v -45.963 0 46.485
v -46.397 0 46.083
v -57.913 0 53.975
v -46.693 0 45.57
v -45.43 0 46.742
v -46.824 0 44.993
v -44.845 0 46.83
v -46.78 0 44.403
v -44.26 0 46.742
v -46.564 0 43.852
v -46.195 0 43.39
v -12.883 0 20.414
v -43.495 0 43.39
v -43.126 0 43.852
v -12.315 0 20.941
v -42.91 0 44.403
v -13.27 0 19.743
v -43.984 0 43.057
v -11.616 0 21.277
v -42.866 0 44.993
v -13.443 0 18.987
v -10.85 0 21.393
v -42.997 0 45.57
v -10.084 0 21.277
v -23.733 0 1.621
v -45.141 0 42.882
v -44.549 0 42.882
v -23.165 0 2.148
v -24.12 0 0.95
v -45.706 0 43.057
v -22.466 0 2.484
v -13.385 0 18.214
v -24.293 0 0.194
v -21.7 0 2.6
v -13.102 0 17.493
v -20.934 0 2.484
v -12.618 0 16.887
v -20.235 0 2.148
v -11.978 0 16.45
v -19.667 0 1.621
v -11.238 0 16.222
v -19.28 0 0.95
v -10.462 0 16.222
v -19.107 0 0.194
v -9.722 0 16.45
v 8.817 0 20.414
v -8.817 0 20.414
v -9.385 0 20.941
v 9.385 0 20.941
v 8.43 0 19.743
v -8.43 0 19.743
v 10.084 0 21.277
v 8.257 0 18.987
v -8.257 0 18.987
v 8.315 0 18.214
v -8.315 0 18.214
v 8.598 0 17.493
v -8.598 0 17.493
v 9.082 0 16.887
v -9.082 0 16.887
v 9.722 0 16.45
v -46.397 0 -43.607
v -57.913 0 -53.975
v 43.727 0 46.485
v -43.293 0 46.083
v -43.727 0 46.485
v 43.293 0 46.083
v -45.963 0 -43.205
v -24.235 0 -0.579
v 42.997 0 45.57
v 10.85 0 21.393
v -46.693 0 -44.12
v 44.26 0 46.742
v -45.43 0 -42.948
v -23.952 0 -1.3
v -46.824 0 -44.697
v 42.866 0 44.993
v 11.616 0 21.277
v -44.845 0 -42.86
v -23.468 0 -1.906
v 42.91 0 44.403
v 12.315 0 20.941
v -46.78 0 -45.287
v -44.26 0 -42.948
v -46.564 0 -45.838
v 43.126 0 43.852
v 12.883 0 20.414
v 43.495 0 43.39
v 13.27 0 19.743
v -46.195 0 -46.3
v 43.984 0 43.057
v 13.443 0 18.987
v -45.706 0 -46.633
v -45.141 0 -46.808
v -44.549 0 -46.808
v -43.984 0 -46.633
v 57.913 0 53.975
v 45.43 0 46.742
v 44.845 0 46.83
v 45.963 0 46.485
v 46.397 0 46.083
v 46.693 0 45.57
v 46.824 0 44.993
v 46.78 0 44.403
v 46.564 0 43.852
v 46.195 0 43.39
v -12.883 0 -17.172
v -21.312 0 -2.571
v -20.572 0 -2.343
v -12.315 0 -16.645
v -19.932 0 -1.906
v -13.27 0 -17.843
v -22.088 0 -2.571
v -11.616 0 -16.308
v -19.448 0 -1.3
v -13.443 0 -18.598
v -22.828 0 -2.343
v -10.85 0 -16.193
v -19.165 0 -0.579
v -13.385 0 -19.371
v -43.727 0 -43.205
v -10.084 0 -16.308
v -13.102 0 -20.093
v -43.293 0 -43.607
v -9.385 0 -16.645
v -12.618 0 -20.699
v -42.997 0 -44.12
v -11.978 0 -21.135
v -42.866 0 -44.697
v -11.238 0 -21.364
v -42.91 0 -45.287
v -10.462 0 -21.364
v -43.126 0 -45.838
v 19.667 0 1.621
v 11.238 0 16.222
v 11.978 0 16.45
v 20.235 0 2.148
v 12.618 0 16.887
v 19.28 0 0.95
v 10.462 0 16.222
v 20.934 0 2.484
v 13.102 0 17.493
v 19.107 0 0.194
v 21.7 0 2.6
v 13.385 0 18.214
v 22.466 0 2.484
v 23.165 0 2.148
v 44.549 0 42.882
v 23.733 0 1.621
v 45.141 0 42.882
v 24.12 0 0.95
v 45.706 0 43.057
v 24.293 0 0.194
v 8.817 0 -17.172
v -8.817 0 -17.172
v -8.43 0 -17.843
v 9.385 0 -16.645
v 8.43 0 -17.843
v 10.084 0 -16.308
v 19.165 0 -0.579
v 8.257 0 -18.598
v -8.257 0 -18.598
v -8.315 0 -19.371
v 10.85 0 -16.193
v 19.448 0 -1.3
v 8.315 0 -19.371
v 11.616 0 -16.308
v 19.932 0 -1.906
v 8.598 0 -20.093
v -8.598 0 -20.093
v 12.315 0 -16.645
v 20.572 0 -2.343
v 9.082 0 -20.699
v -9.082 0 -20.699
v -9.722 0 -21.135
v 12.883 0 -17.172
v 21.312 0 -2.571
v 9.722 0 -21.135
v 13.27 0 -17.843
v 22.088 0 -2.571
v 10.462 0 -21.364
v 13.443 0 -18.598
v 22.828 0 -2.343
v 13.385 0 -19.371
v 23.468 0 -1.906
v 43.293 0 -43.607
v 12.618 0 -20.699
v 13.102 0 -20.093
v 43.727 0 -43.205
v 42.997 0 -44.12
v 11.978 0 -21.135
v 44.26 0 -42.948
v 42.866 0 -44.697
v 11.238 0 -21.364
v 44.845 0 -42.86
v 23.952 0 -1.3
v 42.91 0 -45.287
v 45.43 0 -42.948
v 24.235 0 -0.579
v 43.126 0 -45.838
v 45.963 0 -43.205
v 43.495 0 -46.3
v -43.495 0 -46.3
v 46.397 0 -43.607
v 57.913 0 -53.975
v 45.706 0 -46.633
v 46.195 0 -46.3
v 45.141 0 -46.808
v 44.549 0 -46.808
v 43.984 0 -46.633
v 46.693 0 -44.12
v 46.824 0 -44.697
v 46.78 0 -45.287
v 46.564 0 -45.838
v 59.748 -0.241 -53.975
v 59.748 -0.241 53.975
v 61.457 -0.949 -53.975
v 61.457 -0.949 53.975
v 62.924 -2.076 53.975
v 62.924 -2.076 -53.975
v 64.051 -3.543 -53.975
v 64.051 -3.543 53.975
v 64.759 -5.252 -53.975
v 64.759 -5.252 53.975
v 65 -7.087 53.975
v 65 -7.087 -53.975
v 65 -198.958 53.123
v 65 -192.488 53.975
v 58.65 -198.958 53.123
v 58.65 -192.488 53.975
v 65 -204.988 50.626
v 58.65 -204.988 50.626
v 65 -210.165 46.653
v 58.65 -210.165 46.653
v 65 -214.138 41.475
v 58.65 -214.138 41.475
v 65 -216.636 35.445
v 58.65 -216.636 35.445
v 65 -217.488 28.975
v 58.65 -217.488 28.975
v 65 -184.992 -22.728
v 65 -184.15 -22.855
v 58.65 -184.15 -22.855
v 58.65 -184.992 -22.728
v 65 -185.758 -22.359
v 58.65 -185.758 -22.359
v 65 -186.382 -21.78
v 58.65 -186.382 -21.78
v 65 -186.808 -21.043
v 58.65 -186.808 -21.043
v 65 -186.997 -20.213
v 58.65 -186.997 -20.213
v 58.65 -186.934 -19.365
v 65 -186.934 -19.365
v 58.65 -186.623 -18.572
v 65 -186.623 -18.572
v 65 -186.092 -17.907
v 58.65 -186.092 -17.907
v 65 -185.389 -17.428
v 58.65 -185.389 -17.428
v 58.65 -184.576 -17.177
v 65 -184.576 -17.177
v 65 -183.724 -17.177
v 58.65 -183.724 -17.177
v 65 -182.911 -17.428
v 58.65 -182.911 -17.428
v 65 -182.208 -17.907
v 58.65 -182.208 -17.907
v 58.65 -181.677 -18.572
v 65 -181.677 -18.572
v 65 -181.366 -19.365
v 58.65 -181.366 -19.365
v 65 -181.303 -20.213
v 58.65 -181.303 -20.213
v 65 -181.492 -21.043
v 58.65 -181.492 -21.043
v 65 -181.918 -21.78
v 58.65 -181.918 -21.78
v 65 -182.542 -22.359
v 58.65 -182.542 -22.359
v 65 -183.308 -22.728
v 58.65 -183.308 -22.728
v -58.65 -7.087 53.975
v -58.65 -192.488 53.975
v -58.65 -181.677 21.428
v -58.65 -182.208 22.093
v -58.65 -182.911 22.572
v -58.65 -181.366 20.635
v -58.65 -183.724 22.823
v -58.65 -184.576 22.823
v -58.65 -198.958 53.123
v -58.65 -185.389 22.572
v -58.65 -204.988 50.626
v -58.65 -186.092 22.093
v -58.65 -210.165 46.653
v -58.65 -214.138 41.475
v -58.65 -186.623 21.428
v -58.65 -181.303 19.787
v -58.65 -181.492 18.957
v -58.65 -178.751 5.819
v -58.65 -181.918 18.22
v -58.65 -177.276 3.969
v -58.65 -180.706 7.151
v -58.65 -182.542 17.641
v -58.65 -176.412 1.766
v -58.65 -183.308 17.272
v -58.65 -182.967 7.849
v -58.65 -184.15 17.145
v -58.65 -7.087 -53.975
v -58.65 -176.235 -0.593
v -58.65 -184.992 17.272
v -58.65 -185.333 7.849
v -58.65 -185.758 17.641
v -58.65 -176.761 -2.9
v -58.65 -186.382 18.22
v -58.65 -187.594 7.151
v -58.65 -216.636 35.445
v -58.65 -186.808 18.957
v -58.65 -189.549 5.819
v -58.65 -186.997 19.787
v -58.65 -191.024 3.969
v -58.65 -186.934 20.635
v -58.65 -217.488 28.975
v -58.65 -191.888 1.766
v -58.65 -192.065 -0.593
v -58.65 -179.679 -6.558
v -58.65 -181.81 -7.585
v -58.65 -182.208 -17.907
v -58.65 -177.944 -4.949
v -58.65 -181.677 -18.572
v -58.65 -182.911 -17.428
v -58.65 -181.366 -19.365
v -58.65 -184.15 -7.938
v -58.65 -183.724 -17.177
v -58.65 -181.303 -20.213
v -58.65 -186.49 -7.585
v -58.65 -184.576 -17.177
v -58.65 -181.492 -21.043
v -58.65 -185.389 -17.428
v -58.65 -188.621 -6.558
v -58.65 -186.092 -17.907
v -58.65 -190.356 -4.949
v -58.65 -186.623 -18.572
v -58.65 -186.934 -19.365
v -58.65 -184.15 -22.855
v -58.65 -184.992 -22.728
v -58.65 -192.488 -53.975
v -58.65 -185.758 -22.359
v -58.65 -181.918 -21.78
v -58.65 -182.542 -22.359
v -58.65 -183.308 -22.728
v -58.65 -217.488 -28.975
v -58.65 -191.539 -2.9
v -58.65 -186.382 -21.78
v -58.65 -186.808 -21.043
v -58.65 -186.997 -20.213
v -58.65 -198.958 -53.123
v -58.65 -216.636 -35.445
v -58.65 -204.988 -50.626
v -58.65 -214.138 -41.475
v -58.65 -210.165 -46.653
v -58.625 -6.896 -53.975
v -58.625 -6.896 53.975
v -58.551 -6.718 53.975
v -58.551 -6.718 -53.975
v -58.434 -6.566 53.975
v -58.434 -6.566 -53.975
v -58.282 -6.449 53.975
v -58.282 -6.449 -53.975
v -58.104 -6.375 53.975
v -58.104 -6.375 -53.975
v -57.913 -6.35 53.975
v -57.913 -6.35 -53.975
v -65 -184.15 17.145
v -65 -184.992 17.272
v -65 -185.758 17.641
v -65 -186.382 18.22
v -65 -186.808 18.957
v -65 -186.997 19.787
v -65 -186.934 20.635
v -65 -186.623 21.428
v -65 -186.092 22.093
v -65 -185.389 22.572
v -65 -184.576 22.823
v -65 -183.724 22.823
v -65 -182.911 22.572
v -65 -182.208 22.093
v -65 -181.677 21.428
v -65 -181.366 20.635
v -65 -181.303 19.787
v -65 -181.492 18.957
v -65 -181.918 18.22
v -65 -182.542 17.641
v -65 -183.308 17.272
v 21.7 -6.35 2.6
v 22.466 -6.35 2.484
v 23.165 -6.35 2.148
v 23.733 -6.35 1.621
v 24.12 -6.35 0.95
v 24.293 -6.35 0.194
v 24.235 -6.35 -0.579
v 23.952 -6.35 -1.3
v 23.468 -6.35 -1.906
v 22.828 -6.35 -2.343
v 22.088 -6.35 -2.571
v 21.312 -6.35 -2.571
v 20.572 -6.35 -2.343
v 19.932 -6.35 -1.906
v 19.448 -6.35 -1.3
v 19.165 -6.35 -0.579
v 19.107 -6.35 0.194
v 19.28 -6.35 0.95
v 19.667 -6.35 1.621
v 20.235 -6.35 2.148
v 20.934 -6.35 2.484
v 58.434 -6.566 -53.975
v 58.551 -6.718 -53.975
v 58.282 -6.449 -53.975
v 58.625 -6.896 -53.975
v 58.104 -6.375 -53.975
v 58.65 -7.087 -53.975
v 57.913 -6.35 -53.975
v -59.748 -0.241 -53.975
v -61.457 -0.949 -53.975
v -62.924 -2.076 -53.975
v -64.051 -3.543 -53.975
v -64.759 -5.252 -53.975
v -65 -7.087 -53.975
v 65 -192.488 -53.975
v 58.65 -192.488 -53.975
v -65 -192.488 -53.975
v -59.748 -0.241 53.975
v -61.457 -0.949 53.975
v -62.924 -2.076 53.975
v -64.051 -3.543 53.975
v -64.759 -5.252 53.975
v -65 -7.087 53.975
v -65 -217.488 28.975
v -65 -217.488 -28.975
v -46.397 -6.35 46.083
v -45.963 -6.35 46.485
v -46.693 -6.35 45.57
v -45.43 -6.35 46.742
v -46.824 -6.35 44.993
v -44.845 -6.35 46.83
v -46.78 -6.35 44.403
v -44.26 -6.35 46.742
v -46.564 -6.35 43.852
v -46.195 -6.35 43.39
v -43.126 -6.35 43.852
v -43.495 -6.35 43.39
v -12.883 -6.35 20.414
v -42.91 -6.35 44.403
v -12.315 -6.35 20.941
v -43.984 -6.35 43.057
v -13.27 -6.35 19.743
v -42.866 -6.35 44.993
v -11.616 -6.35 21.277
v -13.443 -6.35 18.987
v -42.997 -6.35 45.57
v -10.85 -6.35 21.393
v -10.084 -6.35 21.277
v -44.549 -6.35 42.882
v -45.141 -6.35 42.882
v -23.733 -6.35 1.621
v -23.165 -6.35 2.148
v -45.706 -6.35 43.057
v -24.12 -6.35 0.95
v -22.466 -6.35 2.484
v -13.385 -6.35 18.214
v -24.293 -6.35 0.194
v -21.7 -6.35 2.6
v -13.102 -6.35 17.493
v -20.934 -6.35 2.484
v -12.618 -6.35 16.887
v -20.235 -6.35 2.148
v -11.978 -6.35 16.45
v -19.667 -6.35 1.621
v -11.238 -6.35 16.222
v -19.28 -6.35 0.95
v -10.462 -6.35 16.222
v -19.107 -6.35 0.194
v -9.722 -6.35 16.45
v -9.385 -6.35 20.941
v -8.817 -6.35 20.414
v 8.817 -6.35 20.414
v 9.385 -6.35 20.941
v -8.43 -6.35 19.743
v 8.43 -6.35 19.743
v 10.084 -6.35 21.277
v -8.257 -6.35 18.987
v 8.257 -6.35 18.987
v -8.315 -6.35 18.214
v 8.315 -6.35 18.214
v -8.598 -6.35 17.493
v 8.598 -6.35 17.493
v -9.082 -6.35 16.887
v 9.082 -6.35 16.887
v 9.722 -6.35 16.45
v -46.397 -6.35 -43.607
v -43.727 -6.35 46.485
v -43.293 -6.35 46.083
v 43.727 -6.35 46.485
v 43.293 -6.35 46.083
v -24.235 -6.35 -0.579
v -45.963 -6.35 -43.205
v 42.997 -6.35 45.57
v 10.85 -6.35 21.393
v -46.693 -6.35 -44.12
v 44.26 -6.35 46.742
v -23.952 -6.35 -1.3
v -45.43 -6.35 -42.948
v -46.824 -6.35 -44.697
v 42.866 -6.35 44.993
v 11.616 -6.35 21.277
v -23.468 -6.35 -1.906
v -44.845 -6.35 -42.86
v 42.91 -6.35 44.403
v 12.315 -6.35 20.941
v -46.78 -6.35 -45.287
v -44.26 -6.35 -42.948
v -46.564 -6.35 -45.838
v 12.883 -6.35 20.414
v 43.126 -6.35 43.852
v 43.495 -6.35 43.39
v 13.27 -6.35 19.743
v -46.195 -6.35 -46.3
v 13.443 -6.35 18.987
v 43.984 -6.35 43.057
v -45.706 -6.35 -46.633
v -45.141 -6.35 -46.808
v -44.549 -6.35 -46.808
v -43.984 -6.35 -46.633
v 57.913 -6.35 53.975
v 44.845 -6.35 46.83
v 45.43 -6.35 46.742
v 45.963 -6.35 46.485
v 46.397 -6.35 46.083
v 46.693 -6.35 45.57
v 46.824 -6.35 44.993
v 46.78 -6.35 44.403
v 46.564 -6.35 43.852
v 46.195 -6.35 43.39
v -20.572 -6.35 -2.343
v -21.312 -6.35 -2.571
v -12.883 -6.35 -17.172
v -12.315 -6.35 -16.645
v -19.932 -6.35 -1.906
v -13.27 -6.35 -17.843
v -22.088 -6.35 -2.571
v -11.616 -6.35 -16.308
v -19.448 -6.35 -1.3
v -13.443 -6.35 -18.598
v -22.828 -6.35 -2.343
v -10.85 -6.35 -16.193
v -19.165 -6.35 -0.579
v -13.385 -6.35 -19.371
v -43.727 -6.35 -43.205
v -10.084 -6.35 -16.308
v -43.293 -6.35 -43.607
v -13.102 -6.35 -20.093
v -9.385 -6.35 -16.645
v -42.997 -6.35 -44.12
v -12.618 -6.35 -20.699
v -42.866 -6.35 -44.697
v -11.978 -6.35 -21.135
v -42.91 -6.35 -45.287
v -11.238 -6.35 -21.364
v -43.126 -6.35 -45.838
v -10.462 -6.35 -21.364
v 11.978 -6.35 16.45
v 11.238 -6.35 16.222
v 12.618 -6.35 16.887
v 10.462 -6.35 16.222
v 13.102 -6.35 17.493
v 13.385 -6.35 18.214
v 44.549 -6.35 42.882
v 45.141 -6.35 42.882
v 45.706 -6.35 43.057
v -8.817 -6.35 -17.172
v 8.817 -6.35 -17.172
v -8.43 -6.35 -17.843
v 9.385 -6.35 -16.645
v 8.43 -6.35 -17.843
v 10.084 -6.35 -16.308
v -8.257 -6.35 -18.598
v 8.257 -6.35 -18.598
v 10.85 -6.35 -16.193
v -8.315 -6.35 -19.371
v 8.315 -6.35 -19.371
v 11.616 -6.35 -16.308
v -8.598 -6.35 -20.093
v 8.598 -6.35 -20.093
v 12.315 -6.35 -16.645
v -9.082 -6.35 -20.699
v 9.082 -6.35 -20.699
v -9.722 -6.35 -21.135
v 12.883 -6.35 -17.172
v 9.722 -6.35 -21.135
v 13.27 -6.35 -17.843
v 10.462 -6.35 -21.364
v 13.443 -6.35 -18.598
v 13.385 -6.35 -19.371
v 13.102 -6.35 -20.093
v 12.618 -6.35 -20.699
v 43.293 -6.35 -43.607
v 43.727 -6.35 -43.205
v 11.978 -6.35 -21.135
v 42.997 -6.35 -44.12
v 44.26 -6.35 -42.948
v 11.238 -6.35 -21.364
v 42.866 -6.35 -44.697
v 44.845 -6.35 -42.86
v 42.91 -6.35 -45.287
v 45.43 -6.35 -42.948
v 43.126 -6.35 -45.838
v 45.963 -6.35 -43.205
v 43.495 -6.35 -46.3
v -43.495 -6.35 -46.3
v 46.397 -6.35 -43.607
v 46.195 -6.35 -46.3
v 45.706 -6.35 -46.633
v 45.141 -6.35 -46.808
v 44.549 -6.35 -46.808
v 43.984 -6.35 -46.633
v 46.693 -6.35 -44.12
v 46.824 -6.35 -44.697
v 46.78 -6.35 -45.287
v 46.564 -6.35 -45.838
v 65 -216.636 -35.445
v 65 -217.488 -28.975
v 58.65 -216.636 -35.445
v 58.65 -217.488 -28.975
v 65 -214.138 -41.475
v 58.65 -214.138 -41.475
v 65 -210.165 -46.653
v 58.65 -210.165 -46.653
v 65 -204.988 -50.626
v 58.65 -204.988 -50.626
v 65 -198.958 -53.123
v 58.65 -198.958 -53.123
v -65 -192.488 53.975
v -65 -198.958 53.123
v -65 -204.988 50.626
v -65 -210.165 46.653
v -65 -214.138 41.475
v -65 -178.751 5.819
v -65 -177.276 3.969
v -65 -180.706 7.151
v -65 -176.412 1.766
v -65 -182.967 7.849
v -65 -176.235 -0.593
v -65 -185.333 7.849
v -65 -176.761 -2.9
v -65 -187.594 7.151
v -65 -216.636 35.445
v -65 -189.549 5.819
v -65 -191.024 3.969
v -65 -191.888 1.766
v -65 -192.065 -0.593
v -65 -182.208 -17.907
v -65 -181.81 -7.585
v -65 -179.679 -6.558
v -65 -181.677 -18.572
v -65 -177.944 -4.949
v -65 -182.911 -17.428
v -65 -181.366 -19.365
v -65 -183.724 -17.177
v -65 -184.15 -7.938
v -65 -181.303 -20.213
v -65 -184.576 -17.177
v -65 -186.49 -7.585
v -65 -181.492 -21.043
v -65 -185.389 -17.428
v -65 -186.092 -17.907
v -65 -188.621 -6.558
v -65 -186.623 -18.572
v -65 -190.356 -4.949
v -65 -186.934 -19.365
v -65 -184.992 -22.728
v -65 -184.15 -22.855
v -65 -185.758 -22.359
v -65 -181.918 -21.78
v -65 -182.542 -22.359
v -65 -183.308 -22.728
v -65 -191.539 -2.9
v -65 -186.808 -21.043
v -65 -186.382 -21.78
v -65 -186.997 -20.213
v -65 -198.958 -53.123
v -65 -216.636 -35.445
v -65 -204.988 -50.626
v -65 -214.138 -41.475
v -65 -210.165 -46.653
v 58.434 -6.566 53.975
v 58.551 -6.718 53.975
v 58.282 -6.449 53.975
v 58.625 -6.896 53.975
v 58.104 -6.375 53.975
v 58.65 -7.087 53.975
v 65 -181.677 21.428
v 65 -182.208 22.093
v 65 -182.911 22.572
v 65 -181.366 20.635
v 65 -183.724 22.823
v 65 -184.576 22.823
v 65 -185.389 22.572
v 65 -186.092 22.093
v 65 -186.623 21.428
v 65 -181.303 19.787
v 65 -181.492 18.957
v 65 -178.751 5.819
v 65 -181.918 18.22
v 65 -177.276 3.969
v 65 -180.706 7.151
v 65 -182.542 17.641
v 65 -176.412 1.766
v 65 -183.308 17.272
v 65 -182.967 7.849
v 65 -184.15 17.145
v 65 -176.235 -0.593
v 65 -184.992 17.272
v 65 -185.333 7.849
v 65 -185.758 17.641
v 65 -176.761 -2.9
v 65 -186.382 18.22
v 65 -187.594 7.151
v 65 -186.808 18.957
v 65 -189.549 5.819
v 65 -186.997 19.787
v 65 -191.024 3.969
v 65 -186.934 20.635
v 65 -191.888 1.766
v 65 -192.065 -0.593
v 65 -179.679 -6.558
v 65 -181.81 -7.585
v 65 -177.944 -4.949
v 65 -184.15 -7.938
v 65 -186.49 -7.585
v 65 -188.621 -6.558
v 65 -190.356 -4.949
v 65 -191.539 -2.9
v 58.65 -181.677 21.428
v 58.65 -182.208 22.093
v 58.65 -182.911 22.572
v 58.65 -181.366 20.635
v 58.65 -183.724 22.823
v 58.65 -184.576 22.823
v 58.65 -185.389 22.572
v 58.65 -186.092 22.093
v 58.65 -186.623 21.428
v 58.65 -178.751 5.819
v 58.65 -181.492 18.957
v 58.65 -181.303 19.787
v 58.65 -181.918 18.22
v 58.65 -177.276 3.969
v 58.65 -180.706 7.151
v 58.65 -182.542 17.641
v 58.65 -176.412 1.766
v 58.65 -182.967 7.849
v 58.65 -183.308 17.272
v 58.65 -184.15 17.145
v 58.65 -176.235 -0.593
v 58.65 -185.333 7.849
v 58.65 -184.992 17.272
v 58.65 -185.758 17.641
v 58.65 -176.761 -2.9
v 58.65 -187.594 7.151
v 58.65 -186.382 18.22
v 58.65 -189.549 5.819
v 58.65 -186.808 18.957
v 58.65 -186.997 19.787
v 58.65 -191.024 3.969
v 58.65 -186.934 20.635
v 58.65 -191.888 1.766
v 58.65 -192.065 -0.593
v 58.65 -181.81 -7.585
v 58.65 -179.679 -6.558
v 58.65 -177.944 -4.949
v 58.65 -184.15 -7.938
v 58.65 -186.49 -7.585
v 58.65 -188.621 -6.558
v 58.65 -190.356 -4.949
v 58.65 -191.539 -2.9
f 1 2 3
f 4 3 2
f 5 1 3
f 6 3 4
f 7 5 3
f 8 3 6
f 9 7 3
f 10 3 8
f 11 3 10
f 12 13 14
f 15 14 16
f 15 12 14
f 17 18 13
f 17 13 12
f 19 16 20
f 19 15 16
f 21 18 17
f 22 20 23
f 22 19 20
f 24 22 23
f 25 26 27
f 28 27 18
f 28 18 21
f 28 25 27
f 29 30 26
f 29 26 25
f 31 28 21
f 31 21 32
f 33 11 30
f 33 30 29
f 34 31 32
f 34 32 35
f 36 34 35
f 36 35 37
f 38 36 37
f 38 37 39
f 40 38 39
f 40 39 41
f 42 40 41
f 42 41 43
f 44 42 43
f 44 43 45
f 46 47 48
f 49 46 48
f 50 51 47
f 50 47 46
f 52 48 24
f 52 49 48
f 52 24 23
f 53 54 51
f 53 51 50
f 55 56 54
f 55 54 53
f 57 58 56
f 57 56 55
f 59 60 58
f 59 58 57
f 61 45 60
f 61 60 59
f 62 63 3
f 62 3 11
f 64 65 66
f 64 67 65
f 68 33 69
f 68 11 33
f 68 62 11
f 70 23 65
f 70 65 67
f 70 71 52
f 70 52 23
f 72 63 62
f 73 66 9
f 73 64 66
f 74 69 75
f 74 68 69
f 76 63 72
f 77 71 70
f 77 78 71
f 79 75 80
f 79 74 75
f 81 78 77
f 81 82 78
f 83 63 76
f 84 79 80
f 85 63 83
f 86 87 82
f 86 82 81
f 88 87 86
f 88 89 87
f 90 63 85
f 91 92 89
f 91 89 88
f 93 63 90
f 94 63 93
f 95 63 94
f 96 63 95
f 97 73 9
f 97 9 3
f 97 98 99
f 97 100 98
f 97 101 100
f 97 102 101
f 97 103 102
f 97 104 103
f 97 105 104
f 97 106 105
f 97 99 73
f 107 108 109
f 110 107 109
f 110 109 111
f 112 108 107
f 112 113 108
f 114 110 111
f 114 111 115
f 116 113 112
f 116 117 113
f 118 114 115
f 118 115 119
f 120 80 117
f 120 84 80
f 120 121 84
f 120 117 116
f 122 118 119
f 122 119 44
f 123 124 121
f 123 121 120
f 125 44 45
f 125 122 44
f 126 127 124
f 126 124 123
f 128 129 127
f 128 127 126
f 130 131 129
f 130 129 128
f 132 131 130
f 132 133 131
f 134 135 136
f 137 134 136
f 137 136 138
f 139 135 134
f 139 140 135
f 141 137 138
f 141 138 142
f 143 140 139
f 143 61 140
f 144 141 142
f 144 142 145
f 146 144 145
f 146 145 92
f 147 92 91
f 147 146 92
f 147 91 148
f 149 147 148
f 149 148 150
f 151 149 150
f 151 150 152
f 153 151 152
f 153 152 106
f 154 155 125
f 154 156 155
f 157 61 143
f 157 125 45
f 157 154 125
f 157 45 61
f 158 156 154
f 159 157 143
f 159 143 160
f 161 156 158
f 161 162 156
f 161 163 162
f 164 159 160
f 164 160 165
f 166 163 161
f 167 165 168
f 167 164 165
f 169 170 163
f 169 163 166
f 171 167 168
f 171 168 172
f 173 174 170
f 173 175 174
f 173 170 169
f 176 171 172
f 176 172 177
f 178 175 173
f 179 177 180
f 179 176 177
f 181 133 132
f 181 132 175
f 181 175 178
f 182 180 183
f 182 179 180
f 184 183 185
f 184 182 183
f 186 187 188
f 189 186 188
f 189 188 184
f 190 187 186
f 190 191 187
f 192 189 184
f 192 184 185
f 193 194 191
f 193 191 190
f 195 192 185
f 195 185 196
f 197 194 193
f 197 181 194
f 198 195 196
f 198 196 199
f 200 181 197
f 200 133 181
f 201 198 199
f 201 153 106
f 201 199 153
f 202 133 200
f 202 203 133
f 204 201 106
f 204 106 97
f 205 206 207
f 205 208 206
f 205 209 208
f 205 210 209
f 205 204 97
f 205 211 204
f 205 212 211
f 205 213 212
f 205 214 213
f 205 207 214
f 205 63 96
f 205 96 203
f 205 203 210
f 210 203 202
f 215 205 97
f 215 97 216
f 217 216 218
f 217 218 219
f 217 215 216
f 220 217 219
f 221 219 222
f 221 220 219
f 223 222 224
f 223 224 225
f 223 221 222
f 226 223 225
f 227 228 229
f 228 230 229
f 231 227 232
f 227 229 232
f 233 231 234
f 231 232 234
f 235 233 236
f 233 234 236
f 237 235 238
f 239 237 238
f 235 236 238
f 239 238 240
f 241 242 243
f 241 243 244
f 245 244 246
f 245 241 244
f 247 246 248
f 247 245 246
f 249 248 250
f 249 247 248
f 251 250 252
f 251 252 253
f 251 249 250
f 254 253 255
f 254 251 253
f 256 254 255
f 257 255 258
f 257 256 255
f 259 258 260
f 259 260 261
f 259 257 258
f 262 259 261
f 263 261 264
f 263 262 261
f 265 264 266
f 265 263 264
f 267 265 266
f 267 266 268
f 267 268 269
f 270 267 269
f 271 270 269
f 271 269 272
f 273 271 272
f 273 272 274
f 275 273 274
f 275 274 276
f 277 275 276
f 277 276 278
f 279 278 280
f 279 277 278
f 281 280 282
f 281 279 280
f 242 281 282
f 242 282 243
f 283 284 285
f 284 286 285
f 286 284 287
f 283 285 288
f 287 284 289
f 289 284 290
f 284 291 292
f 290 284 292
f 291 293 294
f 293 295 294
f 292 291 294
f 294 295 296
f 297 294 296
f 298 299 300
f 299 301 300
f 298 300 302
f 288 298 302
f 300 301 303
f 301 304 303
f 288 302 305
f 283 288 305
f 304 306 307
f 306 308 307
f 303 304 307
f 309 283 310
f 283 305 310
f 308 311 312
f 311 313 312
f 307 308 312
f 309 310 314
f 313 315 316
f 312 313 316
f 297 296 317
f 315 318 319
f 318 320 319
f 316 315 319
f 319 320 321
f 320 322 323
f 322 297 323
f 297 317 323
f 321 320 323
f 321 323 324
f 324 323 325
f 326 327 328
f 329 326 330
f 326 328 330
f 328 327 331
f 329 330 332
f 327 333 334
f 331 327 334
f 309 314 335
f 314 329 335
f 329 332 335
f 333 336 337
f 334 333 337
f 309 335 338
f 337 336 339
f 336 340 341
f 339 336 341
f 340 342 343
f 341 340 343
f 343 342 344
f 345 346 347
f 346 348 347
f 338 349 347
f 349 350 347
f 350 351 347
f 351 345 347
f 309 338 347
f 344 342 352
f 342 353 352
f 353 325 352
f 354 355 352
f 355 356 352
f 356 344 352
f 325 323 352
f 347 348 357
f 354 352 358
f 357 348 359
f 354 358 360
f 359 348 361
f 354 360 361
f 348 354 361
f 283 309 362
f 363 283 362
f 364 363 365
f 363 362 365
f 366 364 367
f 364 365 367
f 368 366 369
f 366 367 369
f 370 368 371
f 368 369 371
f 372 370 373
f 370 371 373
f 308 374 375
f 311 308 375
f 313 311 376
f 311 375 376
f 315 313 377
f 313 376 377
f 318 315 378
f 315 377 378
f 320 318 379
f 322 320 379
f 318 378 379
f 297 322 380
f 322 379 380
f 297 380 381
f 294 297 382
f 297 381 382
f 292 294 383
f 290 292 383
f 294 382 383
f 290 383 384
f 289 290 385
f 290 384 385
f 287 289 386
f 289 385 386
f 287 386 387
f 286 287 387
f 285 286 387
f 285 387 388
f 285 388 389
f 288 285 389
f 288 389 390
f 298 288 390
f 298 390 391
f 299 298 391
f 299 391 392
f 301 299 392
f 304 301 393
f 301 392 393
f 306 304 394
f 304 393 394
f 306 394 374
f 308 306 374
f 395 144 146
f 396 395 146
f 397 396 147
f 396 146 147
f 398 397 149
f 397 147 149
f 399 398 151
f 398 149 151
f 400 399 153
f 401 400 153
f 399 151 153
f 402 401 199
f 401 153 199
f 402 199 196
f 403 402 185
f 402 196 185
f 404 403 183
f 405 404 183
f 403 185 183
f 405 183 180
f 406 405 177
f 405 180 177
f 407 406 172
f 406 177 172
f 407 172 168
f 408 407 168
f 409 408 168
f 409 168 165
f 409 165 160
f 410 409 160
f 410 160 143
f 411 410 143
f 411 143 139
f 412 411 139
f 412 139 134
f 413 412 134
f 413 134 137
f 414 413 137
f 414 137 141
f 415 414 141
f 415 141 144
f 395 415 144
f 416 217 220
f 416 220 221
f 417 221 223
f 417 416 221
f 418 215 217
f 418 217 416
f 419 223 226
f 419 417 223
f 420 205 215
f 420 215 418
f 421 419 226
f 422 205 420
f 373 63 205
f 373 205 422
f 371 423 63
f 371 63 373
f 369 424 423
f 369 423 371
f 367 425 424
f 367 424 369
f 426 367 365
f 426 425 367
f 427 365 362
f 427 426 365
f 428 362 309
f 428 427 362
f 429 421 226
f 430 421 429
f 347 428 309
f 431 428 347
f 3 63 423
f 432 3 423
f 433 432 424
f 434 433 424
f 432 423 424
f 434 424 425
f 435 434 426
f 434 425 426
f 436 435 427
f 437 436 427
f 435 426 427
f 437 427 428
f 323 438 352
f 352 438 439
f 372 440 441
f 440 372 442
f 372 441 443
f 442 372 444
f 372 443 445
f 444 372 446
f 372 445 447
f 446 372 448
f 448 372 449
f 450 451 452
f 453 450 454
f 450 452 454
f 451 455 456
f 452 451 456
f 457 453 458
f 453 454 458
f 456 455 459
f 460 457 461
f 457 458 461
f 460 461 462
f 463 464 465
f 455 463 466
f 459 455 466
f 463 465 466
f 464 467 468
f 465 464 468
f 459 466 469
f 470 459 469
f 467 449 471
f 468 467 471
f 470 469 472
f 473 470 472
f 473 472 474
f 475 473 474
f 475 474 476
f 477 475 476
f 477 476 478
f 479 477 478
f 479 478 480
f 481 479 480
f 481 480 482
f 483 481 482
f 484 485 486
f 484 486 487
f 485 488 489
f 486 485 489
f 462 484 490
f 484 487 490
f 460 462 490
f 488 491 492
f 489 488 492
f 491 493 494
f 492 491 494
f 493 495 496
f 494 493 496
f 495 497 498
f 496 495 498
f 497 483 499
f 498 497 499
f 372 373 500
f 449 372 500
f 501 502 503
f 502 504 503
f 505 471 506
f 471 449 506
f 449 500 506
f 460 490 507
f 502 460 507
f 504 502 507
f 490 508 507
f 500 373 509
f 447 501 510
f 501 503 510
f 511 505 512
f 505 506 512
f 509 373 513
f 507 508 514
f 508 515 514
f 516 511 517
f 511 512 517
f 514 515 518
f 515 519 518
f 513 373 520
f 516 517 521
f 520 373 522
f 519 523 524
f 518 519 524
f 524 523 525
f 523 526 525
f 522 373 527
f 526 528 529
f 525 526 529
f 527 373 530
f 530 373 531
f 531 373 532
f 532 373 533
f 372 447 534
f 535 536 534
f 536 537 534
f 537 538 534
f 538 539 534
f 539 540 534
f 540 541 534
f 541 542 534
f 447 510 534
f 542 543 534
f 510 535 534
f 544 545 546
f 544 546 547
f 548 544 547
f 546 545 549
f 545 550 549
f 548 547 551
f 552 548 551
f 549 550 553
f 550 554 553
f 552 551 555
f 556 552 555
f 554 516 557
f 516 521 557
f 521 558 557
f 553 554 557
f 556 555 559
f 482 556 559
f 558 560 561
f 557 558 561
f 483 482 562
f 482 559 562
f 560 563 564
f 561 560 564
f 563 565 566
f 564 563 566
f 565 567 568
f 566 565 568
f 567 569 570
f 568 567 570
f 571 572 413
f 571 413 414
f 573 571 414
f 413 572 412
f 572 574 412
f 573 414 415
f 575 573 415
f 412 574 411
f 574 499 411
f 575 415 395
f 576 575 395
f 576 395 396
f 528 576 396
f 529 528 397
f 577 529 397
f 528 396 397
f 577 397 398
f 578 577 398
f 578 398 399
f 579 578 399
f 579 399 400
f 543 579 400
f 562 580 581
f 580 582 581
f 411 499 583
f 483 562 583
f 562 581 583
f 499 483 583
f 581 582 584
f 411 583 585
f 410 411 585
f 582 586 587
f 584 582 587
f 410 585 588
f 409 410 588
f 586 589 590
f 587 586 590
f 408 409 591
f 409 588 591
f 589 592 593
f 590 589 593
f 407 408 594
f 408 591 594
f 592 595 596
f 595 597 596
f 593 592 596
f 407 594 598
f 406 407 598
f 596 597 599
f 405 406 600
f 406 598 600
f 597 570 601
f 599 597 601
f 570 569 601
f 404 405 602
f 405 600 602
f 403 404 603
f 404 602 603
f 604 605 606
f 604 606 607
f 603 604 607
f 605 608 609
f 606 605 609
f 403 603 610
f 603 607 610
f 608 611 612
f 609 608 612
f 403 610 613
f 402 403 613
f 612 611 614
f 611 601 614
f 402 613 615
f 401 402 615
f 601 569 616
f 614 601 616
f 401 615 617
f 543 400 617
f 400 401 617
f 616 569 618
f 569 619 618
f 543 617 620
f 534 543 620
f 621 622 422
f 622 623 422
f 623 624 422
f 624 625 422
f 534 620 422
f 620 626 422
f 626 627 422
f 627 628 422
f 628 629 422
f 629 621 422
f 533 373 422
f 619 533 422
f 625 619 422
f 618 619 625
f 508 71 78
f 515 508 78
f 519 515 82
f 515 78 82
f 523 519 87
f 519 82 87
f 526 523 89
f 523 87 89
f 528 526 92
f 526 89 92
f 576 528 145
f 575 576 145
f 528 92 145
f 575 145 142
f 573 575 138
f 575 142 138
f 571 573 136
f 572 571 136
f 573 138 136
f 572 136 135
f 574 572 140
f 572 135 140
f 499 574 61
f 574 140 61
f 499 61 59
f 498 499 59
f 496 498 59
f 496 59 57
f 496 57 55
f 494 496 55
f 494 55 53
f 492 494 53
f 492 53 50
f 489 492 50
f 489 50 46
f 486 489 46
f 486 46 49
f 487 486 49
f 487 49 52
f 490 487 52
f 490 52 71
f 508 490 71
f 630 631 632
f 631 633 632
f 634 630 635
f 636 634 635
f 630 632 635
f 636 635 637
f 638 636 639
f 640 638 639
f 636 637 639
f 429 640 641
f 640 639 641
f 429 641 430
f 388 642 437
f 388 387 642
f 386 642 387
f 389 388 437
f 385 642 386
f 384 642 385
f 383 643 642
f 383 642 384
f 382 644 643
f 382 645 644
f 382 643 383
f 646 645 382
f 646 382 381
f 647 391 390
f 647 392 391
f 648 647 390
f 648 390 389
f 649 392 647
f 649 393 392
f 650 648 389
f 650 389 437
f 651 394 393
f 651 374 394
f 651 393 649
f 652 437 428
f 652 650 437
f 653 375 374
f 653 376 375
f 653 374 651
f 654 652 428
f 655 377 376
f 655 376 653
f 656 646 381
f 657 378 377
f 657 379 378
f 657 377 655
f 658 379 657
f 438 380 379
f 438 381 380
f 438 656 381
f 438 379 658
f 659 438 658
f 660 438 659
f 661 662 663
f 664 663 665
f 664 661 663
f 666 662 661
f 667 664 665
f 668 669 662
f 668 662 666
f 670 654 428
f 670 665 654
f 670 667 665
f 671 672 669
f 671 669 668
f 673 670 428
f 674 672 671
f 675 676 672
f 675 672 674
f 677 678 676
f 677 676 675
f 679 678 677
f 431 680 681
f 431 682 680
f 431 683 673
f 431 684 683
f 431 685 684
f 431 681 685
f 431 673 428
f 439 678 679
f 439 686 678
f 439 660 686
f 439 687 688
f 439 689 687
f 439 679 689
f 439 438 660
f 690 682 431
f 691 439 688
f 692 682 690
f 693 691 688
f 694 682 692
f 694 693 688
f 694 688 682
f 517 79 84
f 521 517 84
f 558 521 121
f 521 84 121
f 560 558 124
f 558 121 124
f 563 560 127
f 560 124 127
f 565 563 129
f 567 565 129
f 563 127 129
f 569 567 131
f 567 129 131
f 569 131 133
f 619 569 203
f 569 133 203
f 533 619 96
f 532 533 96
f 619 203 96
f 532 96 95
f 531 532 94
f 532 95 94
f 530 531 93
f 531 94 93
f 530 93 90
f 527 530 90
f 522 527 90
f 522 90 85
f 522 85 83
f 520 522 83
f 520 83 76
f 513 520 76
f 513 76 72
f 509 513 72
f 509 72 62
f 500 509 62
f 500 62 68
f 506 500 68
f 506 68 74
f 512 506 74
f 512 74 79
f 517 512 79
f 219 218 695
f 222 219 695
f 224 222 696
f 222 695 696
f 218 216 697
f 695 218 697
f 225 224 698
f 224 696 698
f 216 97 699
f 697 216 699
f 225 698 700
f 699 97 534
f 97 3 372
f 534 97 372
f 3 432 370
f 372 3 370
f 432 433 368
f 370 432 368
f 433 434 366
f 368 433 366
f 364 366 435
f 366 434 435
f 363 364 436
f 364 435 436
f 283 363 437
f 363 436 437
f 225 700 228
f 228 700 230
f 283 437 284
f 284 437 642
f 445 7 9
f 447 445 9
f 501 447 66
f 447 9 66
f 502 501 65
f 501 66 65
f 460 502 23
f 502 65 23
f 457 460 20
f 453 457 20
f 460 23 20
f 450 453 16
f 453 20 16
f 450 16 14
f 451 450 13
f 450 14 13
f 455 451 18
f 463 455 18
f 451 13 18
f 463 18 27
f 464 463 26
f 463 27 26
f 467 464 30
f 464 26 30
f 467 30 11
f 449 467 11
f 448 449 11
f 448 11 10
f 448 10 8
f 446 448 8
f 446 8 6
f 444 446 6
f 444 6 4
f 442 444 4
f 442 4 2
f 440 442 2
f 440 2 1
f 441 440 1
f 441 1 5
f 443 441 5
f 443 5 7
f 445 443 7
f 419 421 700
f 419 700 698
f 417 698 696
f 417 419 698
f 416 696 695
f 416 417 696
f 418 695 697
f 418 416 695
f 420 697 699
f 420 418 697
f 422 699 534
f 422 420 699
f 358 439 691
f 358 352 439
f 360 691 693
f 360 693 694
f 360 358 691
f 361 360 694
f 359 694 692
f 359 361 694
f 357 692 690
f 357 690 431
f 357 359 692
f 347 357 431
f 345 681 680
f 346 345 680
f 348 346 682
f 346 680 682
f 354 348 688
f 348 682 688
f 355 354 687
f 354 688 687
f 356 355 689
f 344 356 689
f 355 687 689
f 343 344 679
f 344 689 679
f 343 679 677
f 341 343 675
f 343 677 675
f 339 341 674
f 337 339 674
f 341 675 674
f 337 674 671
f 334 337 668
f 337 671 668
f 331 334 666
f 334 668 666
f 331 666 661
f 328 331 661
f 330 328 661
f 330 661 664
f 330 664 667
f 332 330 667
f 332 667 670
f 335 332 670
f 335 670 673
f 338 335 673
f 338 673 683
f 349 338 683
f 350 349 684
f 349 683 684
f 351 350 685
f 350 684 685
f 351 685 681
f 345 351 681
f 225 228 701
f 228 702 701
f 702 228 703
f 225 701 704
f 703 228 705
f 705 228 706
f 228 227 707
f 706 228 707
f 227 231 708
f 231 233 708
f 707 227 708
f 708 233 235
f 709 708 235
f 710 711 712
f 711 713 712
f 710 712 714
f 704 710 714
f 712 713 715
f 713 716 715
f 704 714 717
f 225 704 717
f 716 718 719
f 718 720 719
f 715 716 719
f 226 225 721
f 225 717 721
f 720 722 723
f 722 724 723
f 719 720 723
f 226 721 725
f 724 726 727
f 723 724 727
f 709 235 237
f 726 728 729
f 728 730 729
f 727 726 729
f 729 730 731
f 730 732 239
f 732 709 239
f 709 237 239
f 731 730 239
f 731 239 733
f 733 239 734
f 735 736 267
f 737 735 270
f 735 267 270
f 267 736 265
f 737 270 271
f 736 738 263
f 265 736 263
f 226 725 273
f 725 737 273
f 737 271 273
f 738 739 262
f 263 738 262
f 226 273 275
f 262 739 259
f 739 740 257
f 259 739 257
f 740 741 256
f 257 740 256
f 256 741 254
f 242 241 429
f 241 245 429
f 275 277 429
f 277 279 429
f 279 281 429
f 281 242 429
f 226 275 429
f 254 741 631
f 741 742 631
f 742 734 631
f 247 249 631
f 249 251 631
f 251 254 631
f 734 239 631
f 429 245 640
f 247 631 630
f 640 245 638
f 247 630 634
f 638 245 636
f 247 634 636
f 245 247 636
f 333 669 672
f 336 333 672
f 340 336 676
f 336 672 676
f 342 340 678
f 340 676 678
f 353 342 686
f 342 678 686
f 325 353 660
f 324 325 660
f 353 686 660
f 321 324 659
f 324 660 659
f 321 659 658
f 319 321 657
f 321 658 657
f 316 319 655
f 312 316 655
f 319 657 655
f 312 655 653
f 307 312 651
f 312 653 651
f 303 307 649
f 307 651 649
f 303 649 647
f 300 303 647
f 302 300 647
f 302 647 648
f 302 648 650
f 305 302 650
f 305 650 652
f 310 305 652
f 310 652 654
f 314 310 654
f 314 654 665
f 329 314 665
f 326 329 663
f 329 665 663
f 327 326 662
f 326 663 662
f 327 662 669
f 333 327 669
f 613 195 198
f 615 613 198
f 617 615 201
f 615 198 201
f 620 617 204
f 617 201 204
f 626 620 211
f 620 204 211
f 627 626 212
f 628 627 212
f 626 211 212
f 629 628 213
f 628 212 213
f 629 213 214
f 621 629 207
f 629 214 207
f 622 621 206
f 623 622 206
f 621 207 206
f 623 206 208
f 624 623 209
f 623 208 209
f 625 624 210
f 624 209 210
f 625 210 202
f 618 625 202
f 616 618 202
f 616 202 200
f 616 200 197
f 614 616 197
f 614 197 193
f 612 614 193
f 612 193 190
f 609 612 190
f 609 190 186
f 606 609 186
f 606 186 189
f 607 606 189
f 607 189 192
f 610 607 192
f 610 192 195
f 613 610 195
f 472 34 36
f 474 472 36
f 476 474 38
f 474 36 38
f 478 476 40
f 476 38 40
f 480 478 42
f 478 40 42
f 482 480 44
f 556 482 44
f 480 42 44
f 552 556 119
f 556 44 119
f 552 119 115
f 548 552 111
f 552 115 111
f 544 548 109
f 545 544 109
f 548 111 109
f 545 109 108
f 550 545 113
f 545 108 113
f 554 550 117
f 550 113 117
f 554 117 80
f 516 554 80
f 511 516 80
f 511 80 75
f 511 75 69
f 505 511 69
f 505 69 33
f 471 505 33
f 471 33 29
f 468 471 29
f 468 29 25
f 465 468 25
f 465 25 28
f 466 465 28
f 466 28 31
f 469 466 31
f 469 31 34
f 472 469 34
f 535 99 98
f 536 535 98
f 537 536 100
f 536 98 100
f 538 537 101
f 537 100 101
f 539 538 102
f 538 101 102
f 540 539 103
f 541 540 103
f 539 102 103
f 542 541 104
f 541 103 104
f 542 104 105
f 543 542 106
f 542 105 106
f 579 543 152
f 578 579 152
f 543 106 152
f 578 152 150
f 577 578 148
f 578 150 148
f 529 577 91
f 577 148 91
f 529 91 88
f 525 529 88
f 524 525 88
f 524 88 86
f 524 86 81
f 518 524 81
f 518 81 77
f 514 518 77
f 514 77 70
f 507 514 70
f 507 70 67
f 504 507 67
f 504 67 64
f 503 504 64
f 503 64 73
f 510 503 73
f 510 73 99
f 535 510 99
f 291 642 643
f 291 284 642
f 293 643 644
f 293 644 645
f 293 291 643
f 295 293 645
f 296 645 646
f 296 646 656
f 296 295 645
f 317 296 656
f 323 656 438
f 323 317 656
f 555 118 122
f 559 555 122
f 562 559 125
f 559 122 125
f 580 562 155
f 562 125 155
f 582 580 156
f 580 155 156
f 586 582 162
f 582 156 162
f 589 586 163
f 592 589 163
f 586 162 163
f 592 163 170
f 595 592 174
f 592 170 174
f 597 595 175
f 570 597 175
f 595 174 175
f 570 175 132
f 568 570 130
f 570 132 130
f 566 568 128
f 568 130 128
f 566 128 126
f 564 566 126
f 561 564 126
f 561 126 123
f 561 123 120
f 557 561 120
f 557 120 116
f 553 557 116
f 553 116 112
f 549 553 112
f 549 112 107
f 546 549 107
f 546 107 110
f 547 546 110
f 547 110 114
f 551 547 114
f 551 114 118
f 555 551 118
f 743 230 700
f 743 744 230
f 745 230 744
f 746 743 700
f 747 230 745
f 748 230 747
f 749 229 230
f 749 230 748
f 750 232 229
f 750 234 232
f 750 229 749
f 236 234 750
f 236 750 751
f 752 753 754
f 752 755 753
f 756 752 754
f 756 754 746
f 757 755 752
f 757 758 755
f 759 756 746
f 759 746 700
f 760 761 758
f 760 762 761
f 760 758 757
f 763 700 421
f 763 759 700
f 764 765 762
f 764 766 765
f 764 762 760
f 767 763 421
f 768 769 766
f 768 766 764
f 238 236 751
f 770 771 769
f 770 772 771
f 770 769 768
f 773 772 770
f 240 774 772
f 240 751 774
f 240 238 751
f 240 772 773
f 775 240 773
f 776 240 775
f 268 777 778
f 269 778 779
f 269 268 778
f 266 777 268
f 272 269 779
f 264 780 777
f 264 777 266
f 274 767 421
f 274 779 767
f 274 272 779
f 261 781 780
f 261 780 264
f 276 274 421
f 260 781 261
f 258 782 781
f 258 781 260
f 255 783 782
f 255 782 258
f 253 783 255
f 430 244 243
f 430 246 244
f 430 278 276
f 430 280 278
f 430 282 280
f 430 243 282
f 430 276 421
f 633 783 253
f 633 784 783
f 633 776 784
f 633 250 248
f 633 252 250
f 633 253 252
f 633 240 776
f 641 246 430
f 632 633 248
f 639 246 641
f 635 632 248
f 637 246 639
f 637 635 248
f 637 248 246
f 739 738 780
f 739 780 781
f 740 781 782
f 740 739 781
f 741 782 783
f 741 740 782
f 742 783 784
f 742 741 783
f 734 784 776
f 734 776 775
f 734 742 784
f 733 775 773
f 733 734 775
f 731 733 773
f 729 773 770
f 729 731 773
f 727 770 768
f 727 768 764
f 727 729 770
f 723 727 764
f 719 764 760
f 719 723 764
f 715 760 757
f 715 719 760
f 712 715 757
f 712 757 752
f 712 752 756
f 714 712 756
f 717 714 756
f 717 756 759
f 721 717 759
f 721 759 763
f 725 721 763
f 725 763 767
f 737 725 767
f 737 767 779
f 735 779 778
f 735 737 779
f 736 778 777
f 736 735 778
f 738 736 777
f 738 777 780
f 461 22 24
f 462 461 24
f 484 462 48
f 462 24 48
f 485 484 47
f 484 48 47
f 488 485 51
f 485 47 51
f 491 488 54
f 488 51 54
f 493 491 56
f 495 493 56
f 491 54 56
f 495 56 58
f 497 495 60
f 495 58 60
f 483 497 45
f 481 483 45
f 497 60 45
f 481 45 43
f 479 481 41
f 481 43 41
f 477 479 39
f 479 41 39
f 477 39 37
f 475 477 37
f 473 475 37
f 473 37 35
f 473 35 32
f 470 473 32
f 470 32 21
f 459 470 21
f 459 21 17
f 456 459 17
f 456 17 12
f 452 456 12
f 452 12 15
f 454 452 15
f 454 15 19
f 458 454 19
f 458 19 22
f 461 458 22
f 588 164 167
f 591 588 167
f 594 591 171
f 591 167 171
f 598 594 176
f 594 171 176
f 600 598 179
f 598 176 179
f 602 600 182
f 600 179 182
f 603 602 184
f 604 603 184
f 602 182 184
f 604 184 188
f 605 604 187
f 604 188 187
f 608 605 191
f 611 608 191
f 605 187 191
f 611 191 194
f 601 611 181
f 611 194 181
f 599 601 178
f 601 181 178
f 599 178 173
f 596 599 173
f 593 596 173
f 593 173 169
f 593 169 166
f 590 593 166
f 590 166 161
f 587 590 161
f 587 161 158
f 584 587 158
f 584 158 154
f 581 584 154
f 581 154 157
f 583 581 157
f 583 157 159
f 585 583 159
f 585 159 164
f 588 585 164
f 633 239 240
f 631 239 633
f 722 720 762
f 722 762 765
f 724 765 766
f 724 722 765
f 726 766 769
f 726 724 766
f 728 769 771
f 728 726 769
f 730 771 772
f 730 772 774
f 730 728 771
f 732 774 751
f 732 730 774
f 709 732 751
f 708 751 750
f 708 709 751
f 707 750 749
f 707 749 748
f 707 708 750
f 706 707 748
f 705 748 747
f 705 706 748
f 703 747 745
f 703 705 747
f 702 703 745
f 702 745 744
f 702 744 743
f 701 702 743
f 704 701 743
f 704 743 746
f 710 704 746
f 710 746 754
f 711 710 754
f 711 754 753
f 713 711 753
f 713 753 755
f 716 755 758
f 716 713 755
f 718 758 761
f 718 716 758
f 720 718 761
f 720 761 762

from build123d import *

# Parameters (mm, degrees)
SKETCH3_W                    = 130
SKETCH3_H                    = 107.95
BASE_FLANGE1_DEPTH           = 6.35
EDGE_FLANGE1_STRIP_W         = 26.8732
EDGE_FLANGE1_STRIP_H         = 6.35
EDGE_FLANGE1_STRIP_CUT_DEPTH = 107.95
EDGE_FLANGE1_DEPTH           = 107.95
EDGE_FLANGE1_PROFILE_W       = 107.95
EDGE_FLANGE1_PROFILE_H       = 210.4009
EDGE_FLANGE1_PROFILE_R       = 2.855235605
EDGE_FLANGE1_PROFILE_R_2     = 7.9375
EDGE_FLANGE1_FLAT_DEPTH      = 6.35
FILLET1_R                    = 25
SKETCH13_R                   = 2.6
FLANGE_COUPLING_HOLES_DEPTH  = 234.321909133
SKETCH15_R                   = 1.985
CUT_EXTRUDE1_DEPTH           = 234.321909133


# Sheet-metal steps are written as plain solids
with BuildPart() as part:
    # Sketch3 → Base-Flange1 (new body)
    with BuildSketch(Plane(origin=(0, 0, 0), x_dir=(1, 0, 0), z_dir=(0, 1, 0))):
        Rectangle(SKETCH3_W, SKETCH3_H)
    extrude(amount=-BASE_FLANGE1_DEPTH)

    # Edge-Flange1 strip (across the edge) → Edge-Flange1 strip cut (cut)
    with BuildSketch(Plane(origin=(65, -6.35, -53.975), x_dir=(-1, 0, 0), z_dir=(0, 0, 1))):
        with Locations((-6.35, -3.175)):
            Rectangle(EDGE_FLANGE1_STRIP_W, EDGE_FLANGE1_STRIP_H)
    edge_flange1_strip_cut = extrude(amount=EDGE_FLANGE1_STRIP_CUT_DEPTH, mode=Mode.SUBTRACT)

    # Edge-Flange1 bend section (across the edge) → Edge-Flange1 (add)
    with BuildSketch(Plane(origin=(65, -6.35, -53.975), x_dir=(-1, 0, 0), z_dir=(0, 0, 1))):
        with BuildLine():
            Line((0, 0.7366), (6.35, 0.7366))
            ThreePointArc((6.35, 0.7366), (6.565745145, 0.215745145), (7.0866, 0))
            Line((7.0866, 0), (7.0866, -6.35))
            ThreePointArc((7.0866, -6.35), (2.075617084, -4.274382916), (0, 0.7366))
        make_face()
    edge_flange1 = extrude(amount=EDGE_FLANGE1_DEPTH)

    # Edge-Flange1 profile (on flange) → Edge-Flange1 flat (add)
    with BuildSketch(Plane(origin=(65, -6.35, 0), x_dir=(0, 0, -1), z_dir=(-1, 0, 0))):
        with Locations((0, 105.93705)):
            Rectangle(EDGE_FLANGE1_PROFILE_W, EDGE_FLANGE1_PROFILE_H)
        with Locations((20, 177.8)):
            Circle(EDGE_FLANGE1_PROFILE_R, mode=Mode.SUBTRACT)
        with Locations((0, 177.8)):
            Circle(EDGE_FLANGE1_PROFILE_R_2, mode=Mode.SUBTRACT)
        with Locations((-20, 177.8)):
            Circle(EDGE_FLANGE1_PROFILE_R, mode=Mode.SUBTRACT)
    edge_flange1_flat = extrude(amount=EDGE_FLANGE1_FLAT_DEPTH)

    # Mirror1: Edge-Flange1 strip cut, Edge-Flange1, Edge-Flange1 flat across plane
    add(edge_flange1_strip_cut.mirror(Plane(origin=(0, 0, 0), x_dir=(0, 0, 1), z_dir=(1, 0, 0))), mode=Mode.SUBTRACT)
    add(edge_flange1.mirror(Plane(origin=(0, 0, 0), x_dir=(0, 0, 1), z_dir=(1, 0, 0))))
    add(edge_flange1_flat.mirror(Plane(origin=(0, 0, 0), x_dir=(0, 0, 1), z_dir=(1, 0, 0))))

    # Fillet1
    fillet1_edges = [part.edges().sort_by_distance(p)[0] for p in [
        (61.825, -217.4875, -53.975),
        (61.825, -217.4875, 53.975),
        (-61.825, -217.4875, 53.975),
        (-61.825, -217.4875, -53.975),
    ]]
    fillet(fillet1_edges, radius=FILLET1_R)

    # Sketch13 → Flange Coupling Holes (cut, through all)
    with BuildSketch(Plane(origin=(0, 0, 0), x_dir=(1, 0, 0), z_dir=(0, 1, 0))):
        with Locations(Location((-21.7, 0, 0), (0, 0, 270))):
            Circle(SKETCH13_R)
        with Locations(Location((-10.85, 18.792751262, 0), (0, 0, 270))):
            Circle(SKETCH13_R)
        with Locations(Location((10.85, 18.792751262, 0), (0, 0, 270))):
            Circle(SKETCH13_R)
        with Locations(Location((21.7, 0, 0), (0, 0, 270))):
            Circle(SKETCH13_R)
        with Locations(Location((10.85, -18.792751262, 0), (0, 0, 270))):
            Circle(SKETCH13_R)
        with Locations(Location((-10.85, -18.792751262, 0), (0, 0, 270))):
            Circle(SKETCH13_R)
    extrude(amount=-FLANGE_COUPLING_HOLES_DEPTH, mode=Mode.SUBTRACT)

    # Sketch15 → Cut-Extrude1 (cut, through all)
    with BuildSketch(Plane(origin=(0, 0, 0), x_dir=(1, 0, 0), z_dir=(0, 1, 0))):
        with Locations(Location((-44.845, 44.845, 0), (0, 0, 270))):
            Circle(SKETCH15_R)
        with Locations(Location((44.845, 44.845, 0), (0, 0, 270))):
            Circle(SKETCH15_R)
        with Locations(Location((44.845, -44.845, 0), (0, 0, 270))):
            Circle(SKETCH15_R)
        with Locations(Location((-44.845, -44.845, 0), (0, 0, 270))):
            Circle(SKETCH15_R)
    extrude(amount=-CUT_EXTRUDE1_DEPTH, mode=Mode.SUBTRACT)


solid = part.part
